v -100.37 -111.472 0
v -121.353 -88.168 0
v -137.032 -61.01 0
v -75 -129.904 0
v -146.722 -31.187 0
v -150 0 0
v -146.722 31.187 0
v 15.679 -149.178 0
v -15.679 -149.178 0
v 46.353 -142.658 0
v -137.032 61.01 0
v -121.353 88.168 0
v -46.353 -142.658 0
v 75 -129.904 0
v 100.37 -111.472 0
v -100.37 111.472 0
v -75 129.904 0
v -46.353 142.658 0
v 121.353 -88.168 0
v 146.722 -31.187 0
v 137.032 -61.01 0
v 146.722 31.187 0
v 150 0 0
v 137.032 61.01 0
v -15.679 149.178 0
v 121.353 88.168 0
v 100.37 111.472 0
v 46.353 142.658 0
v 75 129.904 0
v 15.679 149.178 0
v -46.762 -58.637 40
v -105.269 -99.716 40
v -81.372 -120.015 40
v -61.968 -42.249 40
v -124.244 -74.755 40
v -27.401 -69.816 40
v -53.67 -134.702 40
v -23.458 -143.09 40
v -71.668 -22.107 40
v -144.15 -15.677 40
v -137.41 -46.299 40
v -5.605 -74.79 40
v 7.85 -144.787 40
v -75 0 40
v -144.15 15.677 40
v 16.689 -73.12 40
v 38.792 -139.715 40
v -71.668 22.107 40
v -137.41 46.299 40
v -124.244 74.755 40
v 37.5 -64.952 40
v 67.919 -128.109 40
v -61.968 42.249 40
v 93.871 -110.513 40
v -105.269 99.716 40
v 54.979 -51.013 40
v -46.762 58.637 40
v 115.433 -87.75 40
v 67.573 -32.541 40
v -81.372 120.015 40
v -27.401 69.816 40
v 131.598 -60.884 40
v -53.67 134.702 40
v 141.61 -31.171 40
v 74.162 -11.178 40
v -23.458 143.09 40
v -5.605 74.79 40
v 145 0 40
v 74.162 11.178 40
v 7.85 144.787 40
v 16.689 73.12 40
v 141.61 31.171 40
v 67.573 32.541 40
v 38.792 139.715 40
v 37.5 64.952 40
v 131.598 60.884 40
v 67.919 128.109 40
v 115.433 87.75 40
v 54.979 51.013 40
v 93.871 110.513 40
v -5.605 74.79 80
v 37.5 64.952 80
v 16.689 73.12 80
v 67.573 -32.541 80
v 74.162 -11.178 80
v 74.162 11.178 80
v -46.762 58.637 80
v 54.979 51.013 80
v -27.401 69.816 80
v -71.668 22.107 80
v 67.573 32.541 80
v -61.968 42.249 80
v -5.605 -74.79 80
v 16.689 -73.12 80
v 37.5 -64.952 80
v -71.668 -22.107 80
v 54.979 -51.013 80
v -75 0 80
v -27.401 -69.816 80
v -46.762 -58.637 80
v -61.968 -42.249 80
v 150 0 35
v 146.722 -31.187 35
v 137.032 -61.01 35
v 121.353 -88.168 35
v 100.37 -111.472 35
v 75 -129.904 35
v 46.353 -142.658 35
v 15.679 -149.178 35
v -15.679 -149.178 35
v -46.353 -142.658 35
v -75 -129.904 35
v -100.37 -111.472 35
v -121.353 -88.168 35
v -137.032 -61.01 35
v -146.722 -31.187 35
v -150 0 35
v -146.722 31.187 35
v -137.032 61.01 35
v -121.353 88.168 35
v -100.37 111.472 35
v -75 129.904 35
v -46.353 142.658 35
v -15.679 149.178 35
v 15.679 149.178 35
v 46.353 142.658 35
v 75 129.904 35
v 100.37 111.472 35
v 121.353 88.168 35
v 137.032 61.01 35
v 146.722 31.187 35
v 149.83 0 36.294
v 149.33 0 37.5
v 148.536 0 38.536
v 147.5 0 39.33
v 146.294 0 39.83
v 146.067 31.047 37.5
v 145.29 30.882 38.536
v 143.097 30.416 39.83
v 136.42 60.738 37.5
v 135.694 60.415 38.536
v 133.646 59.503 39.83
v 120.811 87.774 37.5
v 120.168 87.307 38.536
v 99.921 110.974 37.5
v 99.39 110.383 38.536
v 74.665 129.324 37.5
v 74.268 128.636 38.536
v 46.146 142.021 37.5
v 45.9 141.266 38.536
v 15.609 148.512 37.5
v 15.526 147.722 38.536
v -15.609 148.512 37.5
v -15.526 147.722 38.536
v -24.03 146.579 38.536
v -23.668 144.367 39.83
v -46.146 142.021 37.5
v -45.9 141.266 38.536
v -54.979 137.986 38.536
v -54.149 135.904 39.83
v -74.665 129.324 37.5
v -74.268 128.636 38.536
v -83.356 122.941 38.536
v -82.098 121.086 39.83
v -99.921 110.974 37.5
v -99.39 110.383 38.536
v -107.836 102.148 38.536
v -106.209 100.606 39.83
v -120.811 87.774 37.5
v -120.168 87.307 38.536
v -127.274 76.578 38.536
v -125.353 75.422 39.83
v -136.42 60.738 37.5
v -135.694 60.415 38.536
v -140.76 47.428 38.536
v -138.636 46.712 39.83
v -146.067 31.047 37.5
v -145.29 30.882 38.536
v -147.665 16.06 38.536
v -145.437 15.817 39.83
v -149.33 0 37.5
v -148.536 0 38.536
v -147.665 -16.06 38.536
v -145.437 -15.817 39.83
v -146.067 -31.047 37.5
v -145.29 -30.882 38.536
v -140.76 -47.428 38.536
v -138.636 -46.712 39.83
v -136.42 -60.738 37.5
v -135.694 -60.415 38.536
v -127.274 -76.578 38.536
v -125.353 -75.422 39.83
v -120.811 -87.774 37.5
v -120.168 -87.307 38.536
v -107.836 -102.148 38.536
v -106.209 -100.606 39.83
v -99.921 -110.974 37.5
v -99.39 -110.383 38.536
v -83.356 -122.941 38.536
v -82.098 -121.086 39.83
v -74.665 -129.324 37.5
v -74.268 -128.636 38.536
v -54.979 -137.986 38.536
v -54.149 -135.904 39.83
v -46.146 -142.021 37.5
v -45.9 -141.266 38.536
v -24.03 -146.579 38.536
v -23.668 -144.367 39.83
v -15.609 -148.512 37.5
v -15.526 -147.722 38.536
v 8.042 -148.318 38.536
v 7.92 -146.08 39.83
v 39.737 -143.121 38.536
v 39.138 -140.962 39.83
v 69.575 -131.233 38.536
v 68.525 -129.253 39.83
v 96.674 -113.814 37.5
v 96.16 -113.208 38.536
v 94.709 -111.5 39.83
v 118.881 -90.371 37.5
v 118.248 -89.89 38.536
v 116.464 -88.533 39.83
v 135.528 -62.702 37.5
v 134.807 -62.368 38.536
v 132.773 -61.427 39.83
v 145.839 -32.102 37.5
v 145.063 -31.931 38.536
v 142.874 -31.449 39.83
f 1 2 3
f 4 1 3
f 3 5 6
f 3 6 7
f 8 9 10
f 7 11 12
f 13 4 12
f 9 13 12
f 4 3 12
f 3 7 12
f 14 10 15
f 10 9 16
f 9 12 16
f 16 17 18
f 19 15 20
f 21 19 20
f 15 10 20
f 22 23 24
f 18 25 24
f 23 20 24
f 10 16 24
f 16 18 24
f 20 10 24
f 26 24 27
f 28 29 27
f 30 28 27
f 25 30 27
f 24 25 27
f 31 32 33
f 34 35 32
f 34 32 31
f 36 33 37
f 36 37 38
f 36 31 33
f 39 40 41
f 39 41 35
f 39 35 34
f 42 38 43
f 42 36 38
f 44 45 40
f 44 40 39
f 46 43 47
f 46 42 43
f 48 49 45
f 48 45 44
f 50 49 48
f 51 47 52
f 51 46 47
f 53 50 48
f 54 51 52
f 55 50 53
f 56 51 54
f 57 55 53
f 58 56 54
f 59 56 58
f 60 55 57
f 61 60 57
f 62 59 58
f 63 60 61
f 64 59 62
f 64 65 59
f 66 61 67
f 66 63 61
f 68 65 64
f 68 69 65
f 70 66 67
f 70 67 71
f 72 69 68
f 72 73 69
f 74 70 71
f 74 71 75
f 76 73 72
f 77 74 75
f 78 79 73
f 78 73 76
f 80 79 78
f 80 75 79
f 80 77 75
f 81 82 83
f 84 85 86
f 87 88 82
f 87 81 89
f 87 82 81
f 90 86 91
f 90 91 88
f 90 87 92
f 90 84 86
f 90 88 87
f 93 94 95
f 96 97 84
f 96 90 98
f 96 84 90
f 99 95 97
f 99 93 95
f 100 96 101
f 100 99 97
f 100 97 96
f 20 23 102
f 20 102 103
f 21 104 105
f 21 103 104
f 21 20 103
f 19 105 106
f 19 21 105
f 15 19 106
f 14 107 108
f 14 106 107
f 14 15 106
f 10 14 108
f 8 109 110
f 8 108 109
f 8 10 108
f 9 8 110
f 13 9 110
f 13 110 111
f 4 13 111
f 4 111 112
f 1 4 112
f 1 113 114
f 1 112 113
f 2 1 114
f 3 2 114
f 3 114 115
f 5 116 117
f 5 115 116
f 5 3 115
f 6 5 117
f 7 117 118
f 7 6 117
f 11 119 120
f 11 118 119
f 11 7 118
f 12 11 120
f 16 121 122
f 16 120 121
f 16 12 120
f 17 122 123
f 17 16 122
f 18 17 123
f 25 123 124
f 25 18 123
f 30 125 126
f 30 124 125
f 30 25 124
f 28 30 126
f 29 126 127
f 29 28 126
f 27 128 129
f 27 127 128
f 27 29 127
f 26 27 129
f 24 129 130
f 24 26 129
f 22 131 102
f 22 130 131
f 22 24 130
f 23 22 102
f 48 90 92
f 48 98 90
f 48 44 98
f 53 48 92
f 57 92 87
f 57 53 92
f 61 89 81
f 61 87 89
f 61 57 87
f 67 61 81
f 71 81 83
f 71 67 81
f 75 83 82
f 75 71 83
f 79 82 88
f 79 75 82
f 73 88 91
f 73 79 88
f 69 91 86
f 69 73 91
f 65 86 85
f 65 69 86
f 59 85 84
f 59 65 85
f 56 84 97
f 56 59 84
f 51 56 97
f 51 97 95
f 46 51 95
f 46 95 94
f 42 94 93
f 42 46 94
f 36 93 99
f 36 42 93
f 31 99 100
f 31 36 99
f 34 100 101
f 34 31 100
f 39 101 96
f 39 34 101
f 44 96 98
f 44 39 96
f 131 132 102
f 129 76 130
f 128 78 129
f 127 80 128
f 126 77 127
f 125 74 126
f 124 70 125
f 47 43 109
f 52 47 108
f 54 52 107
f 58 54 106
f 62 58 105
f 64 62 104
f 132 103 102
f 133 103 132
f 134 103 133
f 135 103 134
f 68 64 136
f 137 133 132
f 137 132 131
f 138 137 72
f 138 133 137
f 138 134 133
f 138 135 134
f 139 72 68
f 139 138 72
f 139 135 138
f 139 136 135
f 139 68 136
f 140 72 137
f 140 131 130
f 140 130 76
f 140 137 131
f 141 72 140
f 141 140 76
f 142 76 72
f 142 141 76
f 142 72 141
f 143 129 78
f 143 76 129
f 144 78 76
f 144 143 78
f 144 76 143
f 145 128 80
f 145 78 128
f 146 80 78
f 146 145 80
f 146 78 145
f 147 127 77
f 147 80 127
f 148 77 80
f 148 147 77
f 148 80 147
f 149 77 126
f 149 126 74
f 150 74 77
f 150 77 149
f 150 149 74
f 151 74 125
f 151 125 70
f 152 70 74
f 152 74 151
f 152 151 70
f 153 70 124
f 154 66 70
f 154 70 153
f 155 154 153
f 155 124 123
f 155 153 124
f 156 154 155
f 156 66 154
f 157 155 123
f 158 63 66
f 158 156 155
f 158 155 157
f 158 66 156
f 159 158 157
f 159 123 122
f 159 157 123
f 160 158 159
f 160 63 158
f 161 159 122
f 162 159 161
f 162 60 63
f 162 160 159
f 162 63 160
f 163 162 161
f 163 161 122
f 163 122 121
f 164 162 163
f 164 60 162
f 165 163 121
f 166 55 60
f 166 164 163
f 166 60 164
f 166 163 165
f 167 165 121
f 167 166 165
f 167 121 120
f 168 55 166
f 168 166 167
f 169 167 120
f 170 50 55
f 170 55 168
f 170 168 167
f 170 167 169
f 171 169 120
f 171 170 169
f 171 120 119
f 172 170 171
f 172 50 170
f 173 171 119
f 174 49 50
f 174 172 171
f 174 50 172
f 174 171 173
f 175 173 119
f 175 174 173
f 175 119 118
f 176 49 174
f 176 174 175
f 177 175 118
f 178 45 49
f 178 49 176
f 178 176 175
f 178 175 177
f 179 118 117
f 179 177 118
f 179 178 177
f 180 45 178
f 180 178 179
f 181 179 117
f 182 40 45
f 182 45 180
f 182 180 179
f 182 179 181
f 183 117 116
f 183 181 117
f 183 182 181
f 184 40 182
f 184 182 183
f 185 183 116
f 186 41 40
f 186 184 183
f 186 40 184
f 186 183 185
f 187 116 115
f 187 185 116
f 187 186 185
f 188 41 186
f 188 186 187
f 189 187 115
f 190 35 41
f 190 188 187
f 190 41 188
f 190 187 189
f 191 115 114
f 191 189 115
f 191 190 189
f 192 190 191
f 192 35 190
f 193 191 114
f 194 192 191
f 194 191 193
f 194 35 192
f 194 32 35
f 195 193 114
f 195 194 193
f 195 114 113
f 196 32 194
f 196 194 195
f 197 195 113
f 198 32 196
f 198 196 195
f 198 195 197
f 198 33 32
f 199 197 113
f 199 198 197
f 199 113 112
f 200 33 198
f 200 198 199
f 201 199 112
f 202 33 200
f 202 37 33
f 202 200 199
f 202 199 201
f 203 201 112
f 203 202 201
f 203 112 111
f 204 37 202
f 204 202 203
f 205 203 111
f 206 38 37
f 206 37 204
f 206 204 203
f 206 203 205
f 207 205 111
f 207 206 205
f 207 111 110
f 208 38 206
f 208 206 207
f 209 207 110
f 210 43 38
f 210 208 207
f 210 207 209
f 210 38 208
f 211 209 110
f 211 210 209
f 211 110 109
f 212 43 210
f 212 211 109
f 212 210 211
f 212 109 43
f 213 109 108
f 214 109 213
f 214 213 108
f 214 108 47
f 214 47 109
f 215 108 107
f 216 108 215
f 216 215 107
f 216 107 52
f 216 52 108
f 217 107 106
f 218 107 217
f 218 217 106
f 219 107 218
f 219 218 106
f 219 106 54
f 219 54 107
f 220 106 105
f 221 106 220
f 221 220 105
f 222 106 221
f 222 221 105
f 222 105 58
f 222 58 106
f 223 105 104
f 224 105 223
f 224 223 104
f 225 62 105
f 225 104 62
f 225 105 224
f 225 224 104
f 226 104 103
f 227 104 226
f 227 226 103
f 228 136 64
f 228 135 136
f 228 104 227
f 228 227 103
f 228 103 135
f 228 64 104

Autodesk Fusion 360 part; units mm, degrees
sketch "Sketch1" plane through (0, 0, 0) normal (0, 0, 1) x (1, 0, 0)
  circle A0 centre (0, 0) radius 150
extrude "Extrude1" add sketch "Sketch1" along normal blind 40
sketch "Sketch2" plane through (0, 0, 40) normal (0, 0, 1) x (-1, 0, 0)
  circle A0 centre (0, 0) radius 150
  circle A1 centre (0, 0) radius 75
extrude "Extrude2" add sketch "Sketch2" along normal blind 40 contours A1
fillet "Fillet1" radius 5 1 edges at (-139.8491, -54.2423, 40)
